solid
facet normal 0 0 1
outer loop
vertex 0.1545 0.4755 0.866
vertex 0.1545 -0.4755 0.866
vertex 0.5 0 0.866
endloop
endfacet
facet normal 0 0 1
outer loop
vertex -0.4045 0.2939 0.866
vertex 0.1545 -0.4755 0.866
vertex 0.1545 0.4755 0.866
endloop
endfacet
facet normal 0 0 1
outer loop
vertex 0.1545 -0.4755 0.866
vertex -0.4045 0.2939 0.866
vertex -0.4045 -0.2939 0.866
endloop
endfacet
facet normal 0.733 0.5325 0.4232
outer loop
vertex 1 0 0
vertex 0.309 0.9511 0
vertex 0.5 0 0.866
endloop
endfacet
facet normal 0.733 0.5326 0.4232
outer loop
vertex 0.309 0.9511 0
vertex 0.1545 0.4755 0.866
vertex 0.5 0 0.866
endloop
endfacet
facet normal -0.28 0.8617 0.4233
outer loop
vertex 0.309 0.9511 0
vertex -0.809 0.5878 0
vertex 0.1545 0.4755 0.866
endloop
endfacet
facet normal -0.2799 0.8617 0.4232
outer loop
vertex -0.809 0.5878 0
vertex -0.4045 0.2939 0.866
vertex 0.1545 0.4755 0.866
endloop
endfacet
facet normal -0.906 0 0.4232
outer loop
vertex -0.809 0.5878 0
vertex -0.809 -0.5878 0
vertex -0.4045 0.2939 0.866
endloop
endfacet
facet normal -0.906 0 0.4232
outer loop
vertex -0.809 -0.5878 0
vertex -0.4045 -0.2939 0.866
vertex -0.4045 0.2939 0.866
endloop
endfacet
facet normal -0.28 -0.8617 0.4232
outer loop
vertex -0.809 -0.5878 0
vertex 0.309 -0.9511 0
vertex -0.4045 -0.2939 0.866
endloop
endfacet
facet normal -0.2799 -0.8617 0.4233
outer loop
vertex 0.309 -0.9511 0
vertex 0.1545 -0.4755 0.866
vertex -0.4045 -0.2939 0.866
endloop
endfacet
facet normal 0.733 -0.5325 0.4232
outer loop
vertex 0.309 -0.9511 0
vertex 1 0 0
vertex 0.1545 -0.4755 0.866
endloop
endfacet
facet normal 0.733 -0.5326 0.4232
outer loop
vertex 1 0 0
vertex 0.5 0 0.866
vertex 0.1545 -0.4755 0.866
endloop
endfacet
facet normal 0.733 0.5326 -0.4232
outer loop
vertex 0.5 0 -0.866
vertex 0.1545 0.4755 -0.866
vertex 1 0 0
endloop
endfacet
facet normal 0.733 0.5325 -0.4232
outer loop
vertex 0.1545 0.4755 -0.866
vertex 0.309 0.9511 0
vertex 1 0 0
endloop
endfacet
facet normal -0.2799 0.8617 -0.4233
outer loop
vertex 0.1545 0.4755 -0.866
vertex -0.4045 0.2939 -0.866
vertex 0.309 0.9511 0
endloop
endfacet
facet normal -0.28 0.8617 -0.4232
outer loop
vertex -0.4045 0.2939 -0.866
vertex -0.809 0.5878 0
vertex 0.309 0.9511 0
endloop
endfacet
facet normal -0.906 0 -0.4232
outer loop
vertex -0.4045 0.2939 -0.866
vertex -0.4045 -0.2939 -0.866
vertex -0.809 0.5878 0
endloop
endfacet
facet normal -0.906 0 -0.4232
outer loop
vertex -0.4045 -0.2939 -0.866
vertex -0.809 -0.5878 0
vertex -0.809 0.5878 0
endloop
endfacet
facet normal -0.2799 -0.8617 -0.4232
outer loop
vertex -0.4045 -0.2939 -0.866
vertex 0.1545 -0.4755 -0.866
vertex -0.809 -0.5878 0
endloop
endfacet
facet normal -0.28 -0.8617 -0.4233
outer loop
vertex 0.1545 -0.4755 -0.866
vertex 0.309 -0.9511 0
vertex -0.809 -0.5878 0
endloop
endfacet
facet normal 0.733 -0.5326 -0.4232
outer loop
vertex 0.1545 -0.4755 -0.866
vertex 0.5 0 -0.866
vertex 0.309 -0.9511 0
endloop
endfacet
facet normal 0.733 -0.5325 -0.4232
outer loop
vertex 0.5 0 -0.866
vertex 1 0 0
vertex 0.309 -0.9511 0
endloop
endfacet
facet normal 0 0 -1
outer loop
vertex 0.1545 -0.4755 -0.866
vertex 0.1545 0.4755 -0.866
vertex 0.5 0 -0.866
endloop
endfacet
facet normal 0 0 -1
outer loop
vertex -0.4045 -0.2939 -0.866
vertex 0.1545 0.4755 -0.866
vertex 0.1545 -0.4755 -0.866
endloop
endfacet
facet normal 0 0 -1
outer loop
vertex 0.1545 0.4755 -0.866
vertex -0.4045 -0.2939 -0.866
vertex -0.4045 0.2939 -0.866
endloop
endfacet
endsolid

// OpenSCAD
// file: ../../units.scad
/*
 * Basic units.
 * 
 * Originally by Hans Häggström, 2010.
 * Dual licenced under Creative Commons Attribution-Share Alike 3.0 and LGPL2 or later
 */

//
// Internally, OpenSCAD uses arbitrary units, and the mapping from OpenSCAD
// units to real units is determined by the output pipeline.  No amount of code
// we write is going to change that.
//
// However, when building a design against external objects, it is useful to
// ensure that relative sizing is correct.  units.scad contains functions and
// constants for interoperation between measurement systems.
//

//
// Different choices for MCAD_BASE_UNIT.
//
MCAD_BASE_UNIT_MM = 1;
MCAD_BASE_UNIT_CM = 1 / 10;
MCAD_BASE_UNIT_DM = 1 / 100;
MCAD_BASE_UNIT_M  = 1 / 1000;
MCAD_BASE_UNIT_INCH = 1 / 25.4;
MCAD_BASE_UNIT_MIL  = 1000 * MCAD_BASE_UNIT_INCH;

//
// By default, we assume that we are working in millimeters.  However, users may
// override this choice by assigning MCAD_BASE_UNIT to the appropriate
// scaling factor
//
MCAD_BASE_UNIT = MCAD_BASE_UNIT_MM;

//
// Scale functions.
//
// Functions that map from a given scale to OpenSCAD's internal scale.  These
// should be the main means of expression units on quantities.
//
// Internally, they boil the given quantity down to its equivalent in
// millimeters, then use MCAD_BASE_UNIT to convert to OpenSCAD internal units.
//
// Parameters:
//
//  q: The quantity to associate with the named unit.
//
// Examples:
//
//   mm(12) + mil(100)  // 12 millimeters and 100 mils.
//

function mm(q) = MCAD_BASE_UNIT * q;

function cm(q) = mm(10 * q);
function dm(q) = mm(100 * q);
function  m(q) = mm(1000 * q);

function inch(q) =   mm(25.4 * q);
function  mil(q) = inch(q / 1000);
function foot(q) = inch(12 * q);
function yard(q) = inch(36 * q);

//
// Unit constants (deprecated).
//
// Multiplicative constants used to scale between the given units and OpenSCAD
// internal units.  Consider using the equivalent scale functions.
//

mm = mm(1);
cm = mm(10);
dm = mm(100);
 m = mm(1000);

inch = inch(1);

M3 = mm(3);
M4 = mm(4);
M5 = mm(5);
M6 = mm(6);
M8 = mm(8);

//
// MCAD's internal epsilon setting.
//
// Used by the MCAD library whenever a small distance is needed to overlap
// shapes for boolean cutting, etc.  The user may override it.
//
MCAD_EPSILON = mm(0.01);

//
// Unit vectors.
//
X = [1, 0, 0];
Y = [0, 1, 0];
Z = [0, 0, 1];
// main file
// Test user-specified override of MCAD's base unit.
//
// We give mils a special test just to make sure we got the correction factors
// right.

include <../../units.scad>

// Override so that the base unit is mils
MCAD_BASE_UNIT = MCAD_BASE_UNIT_MIL;

if(mil(100) == 100)
{
    sphere(1);
}
else
{
    // Nothing
}
